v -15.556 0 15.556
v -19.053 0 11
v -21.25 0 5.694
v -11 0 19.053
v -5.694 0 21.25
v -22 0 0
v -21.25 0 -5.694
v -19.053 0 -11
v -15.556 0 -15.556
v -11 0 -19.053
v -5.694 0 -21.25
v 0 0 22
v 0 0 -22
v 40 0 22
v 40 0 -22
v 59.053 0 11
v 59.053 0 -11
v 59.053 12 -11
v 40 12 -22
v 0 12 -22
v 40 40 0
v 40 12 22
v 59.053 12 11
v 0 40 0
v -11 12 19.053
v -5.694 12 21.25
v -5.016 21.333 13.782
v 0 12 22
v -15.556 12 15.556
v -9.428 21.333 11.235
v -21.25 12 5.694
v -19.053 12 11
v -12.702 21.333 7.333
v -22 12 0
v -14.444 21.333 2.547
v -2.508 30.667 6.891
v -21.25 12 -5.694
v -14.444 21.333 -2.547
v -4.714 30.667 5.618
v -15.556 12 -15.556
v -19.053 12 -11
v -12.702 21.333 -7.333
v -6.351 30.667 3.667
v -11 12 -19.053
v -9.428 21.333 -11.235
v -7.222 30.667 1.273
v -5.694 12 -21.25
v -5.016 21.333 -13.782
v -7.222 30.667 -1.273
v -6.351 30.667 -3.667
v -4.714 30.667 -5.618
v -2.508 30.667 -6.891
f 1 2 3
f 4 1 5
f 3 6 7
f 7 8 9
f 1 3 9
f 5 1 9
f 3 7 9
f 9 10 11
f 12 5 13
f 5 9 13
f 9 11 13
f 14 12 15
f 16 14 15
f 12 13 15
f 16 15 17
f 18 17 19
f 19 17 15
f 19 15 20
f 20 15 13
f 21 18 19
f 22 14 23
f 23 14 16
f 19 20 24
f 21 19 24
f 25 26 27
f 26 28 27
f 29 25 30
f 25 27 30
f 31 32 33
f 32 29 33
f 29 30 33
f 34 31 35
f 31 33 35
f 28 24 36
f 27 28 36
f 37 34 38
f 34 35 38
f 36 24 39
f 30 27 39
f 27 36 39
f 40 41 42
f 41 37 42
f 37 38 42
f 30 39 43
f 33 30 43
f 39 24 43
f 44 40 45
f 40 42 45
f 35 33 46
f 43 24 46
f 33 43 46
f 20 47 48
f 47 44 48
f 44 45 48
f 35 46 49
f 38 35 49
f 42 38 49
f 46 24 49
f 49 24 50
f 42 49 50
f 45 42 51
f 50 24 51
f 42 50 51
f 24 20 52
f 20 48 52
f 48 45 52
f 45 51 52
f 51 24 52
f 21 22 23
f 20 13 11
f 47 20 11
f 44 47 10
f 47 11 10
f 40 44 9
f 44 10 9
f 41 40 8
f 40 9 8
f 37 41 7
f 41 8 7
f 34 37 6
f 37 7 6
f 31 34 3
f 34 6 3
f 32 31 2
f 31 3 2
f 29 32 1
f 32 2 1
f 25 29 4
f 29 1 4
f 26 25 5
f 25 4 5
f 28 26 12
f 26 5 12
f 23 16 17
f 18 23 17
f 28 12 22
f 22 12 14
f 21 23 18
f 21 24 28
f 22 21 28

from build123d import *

# Parameters (mm, degrees)
EXTRUDE1_DEPTH = 12
EXTRUDE2_DEPTH = 40
REVOLVE1_ANGLE = 180


with BuildPart() as part:
    # Sketch1 → Extrude1 (new body)
    with BuildSketch(Plane(origin=(0, 0, 0), x_dir=(1, 0, 0), z_dir=(0, 1, 0))):
        with BuildLine():
            Line((0, -22), (40, -22))
            Line((40, -22), (59.052558883, -11))
            Line((59.052558883, -11), (59.052558883, 11))
            Line((59.052558883, 11), (40, 22))
            Line((40, 22), (0, 22))
            ThreePointArc((0, 22), (-22, 0), (0, -22))
        make_face()
    extrude(amount=EXTRUDE1_DEPTH)

    # Sketch2 → Extrude2 (add)
    with BuildSketch(Plane(origin=(0, 0, 0), x_dir=(0, 0, -1), z_dir=(1, 0, 0))):
        Polygon((0, 40), (-22, 12), (22, 12), align=None)
    extrude(amount=EXTRUDE2_DEPTH)

    # Sketch3 → Revolve1 (revolve)
    with BuildSketch(Plane.ZY):
        Polygon((0, 40), (0, 12), (22, 12), align=None)
    revolve(axis=Axis((0, 40, 0), (0, -1, 0)), revolution_arc=REVOLVE1_ANGLE)

    # Sketch4 → Loft1 section 0
    with BuildSketch(Plane(origin=(0, 12, 0), x_dir=(-1, 0, 0), z_dir=(0, 1, 0)), mode=Mode.PRIVATE) as loft1_s0:
        Polygon((-59.052558883, 11), (-59.052558883, -11), (-40, -22), (-40, 22), align=None)
    loft([Vertex(40, 40, 0), loft1_s0.sketch])


solid = part.part
